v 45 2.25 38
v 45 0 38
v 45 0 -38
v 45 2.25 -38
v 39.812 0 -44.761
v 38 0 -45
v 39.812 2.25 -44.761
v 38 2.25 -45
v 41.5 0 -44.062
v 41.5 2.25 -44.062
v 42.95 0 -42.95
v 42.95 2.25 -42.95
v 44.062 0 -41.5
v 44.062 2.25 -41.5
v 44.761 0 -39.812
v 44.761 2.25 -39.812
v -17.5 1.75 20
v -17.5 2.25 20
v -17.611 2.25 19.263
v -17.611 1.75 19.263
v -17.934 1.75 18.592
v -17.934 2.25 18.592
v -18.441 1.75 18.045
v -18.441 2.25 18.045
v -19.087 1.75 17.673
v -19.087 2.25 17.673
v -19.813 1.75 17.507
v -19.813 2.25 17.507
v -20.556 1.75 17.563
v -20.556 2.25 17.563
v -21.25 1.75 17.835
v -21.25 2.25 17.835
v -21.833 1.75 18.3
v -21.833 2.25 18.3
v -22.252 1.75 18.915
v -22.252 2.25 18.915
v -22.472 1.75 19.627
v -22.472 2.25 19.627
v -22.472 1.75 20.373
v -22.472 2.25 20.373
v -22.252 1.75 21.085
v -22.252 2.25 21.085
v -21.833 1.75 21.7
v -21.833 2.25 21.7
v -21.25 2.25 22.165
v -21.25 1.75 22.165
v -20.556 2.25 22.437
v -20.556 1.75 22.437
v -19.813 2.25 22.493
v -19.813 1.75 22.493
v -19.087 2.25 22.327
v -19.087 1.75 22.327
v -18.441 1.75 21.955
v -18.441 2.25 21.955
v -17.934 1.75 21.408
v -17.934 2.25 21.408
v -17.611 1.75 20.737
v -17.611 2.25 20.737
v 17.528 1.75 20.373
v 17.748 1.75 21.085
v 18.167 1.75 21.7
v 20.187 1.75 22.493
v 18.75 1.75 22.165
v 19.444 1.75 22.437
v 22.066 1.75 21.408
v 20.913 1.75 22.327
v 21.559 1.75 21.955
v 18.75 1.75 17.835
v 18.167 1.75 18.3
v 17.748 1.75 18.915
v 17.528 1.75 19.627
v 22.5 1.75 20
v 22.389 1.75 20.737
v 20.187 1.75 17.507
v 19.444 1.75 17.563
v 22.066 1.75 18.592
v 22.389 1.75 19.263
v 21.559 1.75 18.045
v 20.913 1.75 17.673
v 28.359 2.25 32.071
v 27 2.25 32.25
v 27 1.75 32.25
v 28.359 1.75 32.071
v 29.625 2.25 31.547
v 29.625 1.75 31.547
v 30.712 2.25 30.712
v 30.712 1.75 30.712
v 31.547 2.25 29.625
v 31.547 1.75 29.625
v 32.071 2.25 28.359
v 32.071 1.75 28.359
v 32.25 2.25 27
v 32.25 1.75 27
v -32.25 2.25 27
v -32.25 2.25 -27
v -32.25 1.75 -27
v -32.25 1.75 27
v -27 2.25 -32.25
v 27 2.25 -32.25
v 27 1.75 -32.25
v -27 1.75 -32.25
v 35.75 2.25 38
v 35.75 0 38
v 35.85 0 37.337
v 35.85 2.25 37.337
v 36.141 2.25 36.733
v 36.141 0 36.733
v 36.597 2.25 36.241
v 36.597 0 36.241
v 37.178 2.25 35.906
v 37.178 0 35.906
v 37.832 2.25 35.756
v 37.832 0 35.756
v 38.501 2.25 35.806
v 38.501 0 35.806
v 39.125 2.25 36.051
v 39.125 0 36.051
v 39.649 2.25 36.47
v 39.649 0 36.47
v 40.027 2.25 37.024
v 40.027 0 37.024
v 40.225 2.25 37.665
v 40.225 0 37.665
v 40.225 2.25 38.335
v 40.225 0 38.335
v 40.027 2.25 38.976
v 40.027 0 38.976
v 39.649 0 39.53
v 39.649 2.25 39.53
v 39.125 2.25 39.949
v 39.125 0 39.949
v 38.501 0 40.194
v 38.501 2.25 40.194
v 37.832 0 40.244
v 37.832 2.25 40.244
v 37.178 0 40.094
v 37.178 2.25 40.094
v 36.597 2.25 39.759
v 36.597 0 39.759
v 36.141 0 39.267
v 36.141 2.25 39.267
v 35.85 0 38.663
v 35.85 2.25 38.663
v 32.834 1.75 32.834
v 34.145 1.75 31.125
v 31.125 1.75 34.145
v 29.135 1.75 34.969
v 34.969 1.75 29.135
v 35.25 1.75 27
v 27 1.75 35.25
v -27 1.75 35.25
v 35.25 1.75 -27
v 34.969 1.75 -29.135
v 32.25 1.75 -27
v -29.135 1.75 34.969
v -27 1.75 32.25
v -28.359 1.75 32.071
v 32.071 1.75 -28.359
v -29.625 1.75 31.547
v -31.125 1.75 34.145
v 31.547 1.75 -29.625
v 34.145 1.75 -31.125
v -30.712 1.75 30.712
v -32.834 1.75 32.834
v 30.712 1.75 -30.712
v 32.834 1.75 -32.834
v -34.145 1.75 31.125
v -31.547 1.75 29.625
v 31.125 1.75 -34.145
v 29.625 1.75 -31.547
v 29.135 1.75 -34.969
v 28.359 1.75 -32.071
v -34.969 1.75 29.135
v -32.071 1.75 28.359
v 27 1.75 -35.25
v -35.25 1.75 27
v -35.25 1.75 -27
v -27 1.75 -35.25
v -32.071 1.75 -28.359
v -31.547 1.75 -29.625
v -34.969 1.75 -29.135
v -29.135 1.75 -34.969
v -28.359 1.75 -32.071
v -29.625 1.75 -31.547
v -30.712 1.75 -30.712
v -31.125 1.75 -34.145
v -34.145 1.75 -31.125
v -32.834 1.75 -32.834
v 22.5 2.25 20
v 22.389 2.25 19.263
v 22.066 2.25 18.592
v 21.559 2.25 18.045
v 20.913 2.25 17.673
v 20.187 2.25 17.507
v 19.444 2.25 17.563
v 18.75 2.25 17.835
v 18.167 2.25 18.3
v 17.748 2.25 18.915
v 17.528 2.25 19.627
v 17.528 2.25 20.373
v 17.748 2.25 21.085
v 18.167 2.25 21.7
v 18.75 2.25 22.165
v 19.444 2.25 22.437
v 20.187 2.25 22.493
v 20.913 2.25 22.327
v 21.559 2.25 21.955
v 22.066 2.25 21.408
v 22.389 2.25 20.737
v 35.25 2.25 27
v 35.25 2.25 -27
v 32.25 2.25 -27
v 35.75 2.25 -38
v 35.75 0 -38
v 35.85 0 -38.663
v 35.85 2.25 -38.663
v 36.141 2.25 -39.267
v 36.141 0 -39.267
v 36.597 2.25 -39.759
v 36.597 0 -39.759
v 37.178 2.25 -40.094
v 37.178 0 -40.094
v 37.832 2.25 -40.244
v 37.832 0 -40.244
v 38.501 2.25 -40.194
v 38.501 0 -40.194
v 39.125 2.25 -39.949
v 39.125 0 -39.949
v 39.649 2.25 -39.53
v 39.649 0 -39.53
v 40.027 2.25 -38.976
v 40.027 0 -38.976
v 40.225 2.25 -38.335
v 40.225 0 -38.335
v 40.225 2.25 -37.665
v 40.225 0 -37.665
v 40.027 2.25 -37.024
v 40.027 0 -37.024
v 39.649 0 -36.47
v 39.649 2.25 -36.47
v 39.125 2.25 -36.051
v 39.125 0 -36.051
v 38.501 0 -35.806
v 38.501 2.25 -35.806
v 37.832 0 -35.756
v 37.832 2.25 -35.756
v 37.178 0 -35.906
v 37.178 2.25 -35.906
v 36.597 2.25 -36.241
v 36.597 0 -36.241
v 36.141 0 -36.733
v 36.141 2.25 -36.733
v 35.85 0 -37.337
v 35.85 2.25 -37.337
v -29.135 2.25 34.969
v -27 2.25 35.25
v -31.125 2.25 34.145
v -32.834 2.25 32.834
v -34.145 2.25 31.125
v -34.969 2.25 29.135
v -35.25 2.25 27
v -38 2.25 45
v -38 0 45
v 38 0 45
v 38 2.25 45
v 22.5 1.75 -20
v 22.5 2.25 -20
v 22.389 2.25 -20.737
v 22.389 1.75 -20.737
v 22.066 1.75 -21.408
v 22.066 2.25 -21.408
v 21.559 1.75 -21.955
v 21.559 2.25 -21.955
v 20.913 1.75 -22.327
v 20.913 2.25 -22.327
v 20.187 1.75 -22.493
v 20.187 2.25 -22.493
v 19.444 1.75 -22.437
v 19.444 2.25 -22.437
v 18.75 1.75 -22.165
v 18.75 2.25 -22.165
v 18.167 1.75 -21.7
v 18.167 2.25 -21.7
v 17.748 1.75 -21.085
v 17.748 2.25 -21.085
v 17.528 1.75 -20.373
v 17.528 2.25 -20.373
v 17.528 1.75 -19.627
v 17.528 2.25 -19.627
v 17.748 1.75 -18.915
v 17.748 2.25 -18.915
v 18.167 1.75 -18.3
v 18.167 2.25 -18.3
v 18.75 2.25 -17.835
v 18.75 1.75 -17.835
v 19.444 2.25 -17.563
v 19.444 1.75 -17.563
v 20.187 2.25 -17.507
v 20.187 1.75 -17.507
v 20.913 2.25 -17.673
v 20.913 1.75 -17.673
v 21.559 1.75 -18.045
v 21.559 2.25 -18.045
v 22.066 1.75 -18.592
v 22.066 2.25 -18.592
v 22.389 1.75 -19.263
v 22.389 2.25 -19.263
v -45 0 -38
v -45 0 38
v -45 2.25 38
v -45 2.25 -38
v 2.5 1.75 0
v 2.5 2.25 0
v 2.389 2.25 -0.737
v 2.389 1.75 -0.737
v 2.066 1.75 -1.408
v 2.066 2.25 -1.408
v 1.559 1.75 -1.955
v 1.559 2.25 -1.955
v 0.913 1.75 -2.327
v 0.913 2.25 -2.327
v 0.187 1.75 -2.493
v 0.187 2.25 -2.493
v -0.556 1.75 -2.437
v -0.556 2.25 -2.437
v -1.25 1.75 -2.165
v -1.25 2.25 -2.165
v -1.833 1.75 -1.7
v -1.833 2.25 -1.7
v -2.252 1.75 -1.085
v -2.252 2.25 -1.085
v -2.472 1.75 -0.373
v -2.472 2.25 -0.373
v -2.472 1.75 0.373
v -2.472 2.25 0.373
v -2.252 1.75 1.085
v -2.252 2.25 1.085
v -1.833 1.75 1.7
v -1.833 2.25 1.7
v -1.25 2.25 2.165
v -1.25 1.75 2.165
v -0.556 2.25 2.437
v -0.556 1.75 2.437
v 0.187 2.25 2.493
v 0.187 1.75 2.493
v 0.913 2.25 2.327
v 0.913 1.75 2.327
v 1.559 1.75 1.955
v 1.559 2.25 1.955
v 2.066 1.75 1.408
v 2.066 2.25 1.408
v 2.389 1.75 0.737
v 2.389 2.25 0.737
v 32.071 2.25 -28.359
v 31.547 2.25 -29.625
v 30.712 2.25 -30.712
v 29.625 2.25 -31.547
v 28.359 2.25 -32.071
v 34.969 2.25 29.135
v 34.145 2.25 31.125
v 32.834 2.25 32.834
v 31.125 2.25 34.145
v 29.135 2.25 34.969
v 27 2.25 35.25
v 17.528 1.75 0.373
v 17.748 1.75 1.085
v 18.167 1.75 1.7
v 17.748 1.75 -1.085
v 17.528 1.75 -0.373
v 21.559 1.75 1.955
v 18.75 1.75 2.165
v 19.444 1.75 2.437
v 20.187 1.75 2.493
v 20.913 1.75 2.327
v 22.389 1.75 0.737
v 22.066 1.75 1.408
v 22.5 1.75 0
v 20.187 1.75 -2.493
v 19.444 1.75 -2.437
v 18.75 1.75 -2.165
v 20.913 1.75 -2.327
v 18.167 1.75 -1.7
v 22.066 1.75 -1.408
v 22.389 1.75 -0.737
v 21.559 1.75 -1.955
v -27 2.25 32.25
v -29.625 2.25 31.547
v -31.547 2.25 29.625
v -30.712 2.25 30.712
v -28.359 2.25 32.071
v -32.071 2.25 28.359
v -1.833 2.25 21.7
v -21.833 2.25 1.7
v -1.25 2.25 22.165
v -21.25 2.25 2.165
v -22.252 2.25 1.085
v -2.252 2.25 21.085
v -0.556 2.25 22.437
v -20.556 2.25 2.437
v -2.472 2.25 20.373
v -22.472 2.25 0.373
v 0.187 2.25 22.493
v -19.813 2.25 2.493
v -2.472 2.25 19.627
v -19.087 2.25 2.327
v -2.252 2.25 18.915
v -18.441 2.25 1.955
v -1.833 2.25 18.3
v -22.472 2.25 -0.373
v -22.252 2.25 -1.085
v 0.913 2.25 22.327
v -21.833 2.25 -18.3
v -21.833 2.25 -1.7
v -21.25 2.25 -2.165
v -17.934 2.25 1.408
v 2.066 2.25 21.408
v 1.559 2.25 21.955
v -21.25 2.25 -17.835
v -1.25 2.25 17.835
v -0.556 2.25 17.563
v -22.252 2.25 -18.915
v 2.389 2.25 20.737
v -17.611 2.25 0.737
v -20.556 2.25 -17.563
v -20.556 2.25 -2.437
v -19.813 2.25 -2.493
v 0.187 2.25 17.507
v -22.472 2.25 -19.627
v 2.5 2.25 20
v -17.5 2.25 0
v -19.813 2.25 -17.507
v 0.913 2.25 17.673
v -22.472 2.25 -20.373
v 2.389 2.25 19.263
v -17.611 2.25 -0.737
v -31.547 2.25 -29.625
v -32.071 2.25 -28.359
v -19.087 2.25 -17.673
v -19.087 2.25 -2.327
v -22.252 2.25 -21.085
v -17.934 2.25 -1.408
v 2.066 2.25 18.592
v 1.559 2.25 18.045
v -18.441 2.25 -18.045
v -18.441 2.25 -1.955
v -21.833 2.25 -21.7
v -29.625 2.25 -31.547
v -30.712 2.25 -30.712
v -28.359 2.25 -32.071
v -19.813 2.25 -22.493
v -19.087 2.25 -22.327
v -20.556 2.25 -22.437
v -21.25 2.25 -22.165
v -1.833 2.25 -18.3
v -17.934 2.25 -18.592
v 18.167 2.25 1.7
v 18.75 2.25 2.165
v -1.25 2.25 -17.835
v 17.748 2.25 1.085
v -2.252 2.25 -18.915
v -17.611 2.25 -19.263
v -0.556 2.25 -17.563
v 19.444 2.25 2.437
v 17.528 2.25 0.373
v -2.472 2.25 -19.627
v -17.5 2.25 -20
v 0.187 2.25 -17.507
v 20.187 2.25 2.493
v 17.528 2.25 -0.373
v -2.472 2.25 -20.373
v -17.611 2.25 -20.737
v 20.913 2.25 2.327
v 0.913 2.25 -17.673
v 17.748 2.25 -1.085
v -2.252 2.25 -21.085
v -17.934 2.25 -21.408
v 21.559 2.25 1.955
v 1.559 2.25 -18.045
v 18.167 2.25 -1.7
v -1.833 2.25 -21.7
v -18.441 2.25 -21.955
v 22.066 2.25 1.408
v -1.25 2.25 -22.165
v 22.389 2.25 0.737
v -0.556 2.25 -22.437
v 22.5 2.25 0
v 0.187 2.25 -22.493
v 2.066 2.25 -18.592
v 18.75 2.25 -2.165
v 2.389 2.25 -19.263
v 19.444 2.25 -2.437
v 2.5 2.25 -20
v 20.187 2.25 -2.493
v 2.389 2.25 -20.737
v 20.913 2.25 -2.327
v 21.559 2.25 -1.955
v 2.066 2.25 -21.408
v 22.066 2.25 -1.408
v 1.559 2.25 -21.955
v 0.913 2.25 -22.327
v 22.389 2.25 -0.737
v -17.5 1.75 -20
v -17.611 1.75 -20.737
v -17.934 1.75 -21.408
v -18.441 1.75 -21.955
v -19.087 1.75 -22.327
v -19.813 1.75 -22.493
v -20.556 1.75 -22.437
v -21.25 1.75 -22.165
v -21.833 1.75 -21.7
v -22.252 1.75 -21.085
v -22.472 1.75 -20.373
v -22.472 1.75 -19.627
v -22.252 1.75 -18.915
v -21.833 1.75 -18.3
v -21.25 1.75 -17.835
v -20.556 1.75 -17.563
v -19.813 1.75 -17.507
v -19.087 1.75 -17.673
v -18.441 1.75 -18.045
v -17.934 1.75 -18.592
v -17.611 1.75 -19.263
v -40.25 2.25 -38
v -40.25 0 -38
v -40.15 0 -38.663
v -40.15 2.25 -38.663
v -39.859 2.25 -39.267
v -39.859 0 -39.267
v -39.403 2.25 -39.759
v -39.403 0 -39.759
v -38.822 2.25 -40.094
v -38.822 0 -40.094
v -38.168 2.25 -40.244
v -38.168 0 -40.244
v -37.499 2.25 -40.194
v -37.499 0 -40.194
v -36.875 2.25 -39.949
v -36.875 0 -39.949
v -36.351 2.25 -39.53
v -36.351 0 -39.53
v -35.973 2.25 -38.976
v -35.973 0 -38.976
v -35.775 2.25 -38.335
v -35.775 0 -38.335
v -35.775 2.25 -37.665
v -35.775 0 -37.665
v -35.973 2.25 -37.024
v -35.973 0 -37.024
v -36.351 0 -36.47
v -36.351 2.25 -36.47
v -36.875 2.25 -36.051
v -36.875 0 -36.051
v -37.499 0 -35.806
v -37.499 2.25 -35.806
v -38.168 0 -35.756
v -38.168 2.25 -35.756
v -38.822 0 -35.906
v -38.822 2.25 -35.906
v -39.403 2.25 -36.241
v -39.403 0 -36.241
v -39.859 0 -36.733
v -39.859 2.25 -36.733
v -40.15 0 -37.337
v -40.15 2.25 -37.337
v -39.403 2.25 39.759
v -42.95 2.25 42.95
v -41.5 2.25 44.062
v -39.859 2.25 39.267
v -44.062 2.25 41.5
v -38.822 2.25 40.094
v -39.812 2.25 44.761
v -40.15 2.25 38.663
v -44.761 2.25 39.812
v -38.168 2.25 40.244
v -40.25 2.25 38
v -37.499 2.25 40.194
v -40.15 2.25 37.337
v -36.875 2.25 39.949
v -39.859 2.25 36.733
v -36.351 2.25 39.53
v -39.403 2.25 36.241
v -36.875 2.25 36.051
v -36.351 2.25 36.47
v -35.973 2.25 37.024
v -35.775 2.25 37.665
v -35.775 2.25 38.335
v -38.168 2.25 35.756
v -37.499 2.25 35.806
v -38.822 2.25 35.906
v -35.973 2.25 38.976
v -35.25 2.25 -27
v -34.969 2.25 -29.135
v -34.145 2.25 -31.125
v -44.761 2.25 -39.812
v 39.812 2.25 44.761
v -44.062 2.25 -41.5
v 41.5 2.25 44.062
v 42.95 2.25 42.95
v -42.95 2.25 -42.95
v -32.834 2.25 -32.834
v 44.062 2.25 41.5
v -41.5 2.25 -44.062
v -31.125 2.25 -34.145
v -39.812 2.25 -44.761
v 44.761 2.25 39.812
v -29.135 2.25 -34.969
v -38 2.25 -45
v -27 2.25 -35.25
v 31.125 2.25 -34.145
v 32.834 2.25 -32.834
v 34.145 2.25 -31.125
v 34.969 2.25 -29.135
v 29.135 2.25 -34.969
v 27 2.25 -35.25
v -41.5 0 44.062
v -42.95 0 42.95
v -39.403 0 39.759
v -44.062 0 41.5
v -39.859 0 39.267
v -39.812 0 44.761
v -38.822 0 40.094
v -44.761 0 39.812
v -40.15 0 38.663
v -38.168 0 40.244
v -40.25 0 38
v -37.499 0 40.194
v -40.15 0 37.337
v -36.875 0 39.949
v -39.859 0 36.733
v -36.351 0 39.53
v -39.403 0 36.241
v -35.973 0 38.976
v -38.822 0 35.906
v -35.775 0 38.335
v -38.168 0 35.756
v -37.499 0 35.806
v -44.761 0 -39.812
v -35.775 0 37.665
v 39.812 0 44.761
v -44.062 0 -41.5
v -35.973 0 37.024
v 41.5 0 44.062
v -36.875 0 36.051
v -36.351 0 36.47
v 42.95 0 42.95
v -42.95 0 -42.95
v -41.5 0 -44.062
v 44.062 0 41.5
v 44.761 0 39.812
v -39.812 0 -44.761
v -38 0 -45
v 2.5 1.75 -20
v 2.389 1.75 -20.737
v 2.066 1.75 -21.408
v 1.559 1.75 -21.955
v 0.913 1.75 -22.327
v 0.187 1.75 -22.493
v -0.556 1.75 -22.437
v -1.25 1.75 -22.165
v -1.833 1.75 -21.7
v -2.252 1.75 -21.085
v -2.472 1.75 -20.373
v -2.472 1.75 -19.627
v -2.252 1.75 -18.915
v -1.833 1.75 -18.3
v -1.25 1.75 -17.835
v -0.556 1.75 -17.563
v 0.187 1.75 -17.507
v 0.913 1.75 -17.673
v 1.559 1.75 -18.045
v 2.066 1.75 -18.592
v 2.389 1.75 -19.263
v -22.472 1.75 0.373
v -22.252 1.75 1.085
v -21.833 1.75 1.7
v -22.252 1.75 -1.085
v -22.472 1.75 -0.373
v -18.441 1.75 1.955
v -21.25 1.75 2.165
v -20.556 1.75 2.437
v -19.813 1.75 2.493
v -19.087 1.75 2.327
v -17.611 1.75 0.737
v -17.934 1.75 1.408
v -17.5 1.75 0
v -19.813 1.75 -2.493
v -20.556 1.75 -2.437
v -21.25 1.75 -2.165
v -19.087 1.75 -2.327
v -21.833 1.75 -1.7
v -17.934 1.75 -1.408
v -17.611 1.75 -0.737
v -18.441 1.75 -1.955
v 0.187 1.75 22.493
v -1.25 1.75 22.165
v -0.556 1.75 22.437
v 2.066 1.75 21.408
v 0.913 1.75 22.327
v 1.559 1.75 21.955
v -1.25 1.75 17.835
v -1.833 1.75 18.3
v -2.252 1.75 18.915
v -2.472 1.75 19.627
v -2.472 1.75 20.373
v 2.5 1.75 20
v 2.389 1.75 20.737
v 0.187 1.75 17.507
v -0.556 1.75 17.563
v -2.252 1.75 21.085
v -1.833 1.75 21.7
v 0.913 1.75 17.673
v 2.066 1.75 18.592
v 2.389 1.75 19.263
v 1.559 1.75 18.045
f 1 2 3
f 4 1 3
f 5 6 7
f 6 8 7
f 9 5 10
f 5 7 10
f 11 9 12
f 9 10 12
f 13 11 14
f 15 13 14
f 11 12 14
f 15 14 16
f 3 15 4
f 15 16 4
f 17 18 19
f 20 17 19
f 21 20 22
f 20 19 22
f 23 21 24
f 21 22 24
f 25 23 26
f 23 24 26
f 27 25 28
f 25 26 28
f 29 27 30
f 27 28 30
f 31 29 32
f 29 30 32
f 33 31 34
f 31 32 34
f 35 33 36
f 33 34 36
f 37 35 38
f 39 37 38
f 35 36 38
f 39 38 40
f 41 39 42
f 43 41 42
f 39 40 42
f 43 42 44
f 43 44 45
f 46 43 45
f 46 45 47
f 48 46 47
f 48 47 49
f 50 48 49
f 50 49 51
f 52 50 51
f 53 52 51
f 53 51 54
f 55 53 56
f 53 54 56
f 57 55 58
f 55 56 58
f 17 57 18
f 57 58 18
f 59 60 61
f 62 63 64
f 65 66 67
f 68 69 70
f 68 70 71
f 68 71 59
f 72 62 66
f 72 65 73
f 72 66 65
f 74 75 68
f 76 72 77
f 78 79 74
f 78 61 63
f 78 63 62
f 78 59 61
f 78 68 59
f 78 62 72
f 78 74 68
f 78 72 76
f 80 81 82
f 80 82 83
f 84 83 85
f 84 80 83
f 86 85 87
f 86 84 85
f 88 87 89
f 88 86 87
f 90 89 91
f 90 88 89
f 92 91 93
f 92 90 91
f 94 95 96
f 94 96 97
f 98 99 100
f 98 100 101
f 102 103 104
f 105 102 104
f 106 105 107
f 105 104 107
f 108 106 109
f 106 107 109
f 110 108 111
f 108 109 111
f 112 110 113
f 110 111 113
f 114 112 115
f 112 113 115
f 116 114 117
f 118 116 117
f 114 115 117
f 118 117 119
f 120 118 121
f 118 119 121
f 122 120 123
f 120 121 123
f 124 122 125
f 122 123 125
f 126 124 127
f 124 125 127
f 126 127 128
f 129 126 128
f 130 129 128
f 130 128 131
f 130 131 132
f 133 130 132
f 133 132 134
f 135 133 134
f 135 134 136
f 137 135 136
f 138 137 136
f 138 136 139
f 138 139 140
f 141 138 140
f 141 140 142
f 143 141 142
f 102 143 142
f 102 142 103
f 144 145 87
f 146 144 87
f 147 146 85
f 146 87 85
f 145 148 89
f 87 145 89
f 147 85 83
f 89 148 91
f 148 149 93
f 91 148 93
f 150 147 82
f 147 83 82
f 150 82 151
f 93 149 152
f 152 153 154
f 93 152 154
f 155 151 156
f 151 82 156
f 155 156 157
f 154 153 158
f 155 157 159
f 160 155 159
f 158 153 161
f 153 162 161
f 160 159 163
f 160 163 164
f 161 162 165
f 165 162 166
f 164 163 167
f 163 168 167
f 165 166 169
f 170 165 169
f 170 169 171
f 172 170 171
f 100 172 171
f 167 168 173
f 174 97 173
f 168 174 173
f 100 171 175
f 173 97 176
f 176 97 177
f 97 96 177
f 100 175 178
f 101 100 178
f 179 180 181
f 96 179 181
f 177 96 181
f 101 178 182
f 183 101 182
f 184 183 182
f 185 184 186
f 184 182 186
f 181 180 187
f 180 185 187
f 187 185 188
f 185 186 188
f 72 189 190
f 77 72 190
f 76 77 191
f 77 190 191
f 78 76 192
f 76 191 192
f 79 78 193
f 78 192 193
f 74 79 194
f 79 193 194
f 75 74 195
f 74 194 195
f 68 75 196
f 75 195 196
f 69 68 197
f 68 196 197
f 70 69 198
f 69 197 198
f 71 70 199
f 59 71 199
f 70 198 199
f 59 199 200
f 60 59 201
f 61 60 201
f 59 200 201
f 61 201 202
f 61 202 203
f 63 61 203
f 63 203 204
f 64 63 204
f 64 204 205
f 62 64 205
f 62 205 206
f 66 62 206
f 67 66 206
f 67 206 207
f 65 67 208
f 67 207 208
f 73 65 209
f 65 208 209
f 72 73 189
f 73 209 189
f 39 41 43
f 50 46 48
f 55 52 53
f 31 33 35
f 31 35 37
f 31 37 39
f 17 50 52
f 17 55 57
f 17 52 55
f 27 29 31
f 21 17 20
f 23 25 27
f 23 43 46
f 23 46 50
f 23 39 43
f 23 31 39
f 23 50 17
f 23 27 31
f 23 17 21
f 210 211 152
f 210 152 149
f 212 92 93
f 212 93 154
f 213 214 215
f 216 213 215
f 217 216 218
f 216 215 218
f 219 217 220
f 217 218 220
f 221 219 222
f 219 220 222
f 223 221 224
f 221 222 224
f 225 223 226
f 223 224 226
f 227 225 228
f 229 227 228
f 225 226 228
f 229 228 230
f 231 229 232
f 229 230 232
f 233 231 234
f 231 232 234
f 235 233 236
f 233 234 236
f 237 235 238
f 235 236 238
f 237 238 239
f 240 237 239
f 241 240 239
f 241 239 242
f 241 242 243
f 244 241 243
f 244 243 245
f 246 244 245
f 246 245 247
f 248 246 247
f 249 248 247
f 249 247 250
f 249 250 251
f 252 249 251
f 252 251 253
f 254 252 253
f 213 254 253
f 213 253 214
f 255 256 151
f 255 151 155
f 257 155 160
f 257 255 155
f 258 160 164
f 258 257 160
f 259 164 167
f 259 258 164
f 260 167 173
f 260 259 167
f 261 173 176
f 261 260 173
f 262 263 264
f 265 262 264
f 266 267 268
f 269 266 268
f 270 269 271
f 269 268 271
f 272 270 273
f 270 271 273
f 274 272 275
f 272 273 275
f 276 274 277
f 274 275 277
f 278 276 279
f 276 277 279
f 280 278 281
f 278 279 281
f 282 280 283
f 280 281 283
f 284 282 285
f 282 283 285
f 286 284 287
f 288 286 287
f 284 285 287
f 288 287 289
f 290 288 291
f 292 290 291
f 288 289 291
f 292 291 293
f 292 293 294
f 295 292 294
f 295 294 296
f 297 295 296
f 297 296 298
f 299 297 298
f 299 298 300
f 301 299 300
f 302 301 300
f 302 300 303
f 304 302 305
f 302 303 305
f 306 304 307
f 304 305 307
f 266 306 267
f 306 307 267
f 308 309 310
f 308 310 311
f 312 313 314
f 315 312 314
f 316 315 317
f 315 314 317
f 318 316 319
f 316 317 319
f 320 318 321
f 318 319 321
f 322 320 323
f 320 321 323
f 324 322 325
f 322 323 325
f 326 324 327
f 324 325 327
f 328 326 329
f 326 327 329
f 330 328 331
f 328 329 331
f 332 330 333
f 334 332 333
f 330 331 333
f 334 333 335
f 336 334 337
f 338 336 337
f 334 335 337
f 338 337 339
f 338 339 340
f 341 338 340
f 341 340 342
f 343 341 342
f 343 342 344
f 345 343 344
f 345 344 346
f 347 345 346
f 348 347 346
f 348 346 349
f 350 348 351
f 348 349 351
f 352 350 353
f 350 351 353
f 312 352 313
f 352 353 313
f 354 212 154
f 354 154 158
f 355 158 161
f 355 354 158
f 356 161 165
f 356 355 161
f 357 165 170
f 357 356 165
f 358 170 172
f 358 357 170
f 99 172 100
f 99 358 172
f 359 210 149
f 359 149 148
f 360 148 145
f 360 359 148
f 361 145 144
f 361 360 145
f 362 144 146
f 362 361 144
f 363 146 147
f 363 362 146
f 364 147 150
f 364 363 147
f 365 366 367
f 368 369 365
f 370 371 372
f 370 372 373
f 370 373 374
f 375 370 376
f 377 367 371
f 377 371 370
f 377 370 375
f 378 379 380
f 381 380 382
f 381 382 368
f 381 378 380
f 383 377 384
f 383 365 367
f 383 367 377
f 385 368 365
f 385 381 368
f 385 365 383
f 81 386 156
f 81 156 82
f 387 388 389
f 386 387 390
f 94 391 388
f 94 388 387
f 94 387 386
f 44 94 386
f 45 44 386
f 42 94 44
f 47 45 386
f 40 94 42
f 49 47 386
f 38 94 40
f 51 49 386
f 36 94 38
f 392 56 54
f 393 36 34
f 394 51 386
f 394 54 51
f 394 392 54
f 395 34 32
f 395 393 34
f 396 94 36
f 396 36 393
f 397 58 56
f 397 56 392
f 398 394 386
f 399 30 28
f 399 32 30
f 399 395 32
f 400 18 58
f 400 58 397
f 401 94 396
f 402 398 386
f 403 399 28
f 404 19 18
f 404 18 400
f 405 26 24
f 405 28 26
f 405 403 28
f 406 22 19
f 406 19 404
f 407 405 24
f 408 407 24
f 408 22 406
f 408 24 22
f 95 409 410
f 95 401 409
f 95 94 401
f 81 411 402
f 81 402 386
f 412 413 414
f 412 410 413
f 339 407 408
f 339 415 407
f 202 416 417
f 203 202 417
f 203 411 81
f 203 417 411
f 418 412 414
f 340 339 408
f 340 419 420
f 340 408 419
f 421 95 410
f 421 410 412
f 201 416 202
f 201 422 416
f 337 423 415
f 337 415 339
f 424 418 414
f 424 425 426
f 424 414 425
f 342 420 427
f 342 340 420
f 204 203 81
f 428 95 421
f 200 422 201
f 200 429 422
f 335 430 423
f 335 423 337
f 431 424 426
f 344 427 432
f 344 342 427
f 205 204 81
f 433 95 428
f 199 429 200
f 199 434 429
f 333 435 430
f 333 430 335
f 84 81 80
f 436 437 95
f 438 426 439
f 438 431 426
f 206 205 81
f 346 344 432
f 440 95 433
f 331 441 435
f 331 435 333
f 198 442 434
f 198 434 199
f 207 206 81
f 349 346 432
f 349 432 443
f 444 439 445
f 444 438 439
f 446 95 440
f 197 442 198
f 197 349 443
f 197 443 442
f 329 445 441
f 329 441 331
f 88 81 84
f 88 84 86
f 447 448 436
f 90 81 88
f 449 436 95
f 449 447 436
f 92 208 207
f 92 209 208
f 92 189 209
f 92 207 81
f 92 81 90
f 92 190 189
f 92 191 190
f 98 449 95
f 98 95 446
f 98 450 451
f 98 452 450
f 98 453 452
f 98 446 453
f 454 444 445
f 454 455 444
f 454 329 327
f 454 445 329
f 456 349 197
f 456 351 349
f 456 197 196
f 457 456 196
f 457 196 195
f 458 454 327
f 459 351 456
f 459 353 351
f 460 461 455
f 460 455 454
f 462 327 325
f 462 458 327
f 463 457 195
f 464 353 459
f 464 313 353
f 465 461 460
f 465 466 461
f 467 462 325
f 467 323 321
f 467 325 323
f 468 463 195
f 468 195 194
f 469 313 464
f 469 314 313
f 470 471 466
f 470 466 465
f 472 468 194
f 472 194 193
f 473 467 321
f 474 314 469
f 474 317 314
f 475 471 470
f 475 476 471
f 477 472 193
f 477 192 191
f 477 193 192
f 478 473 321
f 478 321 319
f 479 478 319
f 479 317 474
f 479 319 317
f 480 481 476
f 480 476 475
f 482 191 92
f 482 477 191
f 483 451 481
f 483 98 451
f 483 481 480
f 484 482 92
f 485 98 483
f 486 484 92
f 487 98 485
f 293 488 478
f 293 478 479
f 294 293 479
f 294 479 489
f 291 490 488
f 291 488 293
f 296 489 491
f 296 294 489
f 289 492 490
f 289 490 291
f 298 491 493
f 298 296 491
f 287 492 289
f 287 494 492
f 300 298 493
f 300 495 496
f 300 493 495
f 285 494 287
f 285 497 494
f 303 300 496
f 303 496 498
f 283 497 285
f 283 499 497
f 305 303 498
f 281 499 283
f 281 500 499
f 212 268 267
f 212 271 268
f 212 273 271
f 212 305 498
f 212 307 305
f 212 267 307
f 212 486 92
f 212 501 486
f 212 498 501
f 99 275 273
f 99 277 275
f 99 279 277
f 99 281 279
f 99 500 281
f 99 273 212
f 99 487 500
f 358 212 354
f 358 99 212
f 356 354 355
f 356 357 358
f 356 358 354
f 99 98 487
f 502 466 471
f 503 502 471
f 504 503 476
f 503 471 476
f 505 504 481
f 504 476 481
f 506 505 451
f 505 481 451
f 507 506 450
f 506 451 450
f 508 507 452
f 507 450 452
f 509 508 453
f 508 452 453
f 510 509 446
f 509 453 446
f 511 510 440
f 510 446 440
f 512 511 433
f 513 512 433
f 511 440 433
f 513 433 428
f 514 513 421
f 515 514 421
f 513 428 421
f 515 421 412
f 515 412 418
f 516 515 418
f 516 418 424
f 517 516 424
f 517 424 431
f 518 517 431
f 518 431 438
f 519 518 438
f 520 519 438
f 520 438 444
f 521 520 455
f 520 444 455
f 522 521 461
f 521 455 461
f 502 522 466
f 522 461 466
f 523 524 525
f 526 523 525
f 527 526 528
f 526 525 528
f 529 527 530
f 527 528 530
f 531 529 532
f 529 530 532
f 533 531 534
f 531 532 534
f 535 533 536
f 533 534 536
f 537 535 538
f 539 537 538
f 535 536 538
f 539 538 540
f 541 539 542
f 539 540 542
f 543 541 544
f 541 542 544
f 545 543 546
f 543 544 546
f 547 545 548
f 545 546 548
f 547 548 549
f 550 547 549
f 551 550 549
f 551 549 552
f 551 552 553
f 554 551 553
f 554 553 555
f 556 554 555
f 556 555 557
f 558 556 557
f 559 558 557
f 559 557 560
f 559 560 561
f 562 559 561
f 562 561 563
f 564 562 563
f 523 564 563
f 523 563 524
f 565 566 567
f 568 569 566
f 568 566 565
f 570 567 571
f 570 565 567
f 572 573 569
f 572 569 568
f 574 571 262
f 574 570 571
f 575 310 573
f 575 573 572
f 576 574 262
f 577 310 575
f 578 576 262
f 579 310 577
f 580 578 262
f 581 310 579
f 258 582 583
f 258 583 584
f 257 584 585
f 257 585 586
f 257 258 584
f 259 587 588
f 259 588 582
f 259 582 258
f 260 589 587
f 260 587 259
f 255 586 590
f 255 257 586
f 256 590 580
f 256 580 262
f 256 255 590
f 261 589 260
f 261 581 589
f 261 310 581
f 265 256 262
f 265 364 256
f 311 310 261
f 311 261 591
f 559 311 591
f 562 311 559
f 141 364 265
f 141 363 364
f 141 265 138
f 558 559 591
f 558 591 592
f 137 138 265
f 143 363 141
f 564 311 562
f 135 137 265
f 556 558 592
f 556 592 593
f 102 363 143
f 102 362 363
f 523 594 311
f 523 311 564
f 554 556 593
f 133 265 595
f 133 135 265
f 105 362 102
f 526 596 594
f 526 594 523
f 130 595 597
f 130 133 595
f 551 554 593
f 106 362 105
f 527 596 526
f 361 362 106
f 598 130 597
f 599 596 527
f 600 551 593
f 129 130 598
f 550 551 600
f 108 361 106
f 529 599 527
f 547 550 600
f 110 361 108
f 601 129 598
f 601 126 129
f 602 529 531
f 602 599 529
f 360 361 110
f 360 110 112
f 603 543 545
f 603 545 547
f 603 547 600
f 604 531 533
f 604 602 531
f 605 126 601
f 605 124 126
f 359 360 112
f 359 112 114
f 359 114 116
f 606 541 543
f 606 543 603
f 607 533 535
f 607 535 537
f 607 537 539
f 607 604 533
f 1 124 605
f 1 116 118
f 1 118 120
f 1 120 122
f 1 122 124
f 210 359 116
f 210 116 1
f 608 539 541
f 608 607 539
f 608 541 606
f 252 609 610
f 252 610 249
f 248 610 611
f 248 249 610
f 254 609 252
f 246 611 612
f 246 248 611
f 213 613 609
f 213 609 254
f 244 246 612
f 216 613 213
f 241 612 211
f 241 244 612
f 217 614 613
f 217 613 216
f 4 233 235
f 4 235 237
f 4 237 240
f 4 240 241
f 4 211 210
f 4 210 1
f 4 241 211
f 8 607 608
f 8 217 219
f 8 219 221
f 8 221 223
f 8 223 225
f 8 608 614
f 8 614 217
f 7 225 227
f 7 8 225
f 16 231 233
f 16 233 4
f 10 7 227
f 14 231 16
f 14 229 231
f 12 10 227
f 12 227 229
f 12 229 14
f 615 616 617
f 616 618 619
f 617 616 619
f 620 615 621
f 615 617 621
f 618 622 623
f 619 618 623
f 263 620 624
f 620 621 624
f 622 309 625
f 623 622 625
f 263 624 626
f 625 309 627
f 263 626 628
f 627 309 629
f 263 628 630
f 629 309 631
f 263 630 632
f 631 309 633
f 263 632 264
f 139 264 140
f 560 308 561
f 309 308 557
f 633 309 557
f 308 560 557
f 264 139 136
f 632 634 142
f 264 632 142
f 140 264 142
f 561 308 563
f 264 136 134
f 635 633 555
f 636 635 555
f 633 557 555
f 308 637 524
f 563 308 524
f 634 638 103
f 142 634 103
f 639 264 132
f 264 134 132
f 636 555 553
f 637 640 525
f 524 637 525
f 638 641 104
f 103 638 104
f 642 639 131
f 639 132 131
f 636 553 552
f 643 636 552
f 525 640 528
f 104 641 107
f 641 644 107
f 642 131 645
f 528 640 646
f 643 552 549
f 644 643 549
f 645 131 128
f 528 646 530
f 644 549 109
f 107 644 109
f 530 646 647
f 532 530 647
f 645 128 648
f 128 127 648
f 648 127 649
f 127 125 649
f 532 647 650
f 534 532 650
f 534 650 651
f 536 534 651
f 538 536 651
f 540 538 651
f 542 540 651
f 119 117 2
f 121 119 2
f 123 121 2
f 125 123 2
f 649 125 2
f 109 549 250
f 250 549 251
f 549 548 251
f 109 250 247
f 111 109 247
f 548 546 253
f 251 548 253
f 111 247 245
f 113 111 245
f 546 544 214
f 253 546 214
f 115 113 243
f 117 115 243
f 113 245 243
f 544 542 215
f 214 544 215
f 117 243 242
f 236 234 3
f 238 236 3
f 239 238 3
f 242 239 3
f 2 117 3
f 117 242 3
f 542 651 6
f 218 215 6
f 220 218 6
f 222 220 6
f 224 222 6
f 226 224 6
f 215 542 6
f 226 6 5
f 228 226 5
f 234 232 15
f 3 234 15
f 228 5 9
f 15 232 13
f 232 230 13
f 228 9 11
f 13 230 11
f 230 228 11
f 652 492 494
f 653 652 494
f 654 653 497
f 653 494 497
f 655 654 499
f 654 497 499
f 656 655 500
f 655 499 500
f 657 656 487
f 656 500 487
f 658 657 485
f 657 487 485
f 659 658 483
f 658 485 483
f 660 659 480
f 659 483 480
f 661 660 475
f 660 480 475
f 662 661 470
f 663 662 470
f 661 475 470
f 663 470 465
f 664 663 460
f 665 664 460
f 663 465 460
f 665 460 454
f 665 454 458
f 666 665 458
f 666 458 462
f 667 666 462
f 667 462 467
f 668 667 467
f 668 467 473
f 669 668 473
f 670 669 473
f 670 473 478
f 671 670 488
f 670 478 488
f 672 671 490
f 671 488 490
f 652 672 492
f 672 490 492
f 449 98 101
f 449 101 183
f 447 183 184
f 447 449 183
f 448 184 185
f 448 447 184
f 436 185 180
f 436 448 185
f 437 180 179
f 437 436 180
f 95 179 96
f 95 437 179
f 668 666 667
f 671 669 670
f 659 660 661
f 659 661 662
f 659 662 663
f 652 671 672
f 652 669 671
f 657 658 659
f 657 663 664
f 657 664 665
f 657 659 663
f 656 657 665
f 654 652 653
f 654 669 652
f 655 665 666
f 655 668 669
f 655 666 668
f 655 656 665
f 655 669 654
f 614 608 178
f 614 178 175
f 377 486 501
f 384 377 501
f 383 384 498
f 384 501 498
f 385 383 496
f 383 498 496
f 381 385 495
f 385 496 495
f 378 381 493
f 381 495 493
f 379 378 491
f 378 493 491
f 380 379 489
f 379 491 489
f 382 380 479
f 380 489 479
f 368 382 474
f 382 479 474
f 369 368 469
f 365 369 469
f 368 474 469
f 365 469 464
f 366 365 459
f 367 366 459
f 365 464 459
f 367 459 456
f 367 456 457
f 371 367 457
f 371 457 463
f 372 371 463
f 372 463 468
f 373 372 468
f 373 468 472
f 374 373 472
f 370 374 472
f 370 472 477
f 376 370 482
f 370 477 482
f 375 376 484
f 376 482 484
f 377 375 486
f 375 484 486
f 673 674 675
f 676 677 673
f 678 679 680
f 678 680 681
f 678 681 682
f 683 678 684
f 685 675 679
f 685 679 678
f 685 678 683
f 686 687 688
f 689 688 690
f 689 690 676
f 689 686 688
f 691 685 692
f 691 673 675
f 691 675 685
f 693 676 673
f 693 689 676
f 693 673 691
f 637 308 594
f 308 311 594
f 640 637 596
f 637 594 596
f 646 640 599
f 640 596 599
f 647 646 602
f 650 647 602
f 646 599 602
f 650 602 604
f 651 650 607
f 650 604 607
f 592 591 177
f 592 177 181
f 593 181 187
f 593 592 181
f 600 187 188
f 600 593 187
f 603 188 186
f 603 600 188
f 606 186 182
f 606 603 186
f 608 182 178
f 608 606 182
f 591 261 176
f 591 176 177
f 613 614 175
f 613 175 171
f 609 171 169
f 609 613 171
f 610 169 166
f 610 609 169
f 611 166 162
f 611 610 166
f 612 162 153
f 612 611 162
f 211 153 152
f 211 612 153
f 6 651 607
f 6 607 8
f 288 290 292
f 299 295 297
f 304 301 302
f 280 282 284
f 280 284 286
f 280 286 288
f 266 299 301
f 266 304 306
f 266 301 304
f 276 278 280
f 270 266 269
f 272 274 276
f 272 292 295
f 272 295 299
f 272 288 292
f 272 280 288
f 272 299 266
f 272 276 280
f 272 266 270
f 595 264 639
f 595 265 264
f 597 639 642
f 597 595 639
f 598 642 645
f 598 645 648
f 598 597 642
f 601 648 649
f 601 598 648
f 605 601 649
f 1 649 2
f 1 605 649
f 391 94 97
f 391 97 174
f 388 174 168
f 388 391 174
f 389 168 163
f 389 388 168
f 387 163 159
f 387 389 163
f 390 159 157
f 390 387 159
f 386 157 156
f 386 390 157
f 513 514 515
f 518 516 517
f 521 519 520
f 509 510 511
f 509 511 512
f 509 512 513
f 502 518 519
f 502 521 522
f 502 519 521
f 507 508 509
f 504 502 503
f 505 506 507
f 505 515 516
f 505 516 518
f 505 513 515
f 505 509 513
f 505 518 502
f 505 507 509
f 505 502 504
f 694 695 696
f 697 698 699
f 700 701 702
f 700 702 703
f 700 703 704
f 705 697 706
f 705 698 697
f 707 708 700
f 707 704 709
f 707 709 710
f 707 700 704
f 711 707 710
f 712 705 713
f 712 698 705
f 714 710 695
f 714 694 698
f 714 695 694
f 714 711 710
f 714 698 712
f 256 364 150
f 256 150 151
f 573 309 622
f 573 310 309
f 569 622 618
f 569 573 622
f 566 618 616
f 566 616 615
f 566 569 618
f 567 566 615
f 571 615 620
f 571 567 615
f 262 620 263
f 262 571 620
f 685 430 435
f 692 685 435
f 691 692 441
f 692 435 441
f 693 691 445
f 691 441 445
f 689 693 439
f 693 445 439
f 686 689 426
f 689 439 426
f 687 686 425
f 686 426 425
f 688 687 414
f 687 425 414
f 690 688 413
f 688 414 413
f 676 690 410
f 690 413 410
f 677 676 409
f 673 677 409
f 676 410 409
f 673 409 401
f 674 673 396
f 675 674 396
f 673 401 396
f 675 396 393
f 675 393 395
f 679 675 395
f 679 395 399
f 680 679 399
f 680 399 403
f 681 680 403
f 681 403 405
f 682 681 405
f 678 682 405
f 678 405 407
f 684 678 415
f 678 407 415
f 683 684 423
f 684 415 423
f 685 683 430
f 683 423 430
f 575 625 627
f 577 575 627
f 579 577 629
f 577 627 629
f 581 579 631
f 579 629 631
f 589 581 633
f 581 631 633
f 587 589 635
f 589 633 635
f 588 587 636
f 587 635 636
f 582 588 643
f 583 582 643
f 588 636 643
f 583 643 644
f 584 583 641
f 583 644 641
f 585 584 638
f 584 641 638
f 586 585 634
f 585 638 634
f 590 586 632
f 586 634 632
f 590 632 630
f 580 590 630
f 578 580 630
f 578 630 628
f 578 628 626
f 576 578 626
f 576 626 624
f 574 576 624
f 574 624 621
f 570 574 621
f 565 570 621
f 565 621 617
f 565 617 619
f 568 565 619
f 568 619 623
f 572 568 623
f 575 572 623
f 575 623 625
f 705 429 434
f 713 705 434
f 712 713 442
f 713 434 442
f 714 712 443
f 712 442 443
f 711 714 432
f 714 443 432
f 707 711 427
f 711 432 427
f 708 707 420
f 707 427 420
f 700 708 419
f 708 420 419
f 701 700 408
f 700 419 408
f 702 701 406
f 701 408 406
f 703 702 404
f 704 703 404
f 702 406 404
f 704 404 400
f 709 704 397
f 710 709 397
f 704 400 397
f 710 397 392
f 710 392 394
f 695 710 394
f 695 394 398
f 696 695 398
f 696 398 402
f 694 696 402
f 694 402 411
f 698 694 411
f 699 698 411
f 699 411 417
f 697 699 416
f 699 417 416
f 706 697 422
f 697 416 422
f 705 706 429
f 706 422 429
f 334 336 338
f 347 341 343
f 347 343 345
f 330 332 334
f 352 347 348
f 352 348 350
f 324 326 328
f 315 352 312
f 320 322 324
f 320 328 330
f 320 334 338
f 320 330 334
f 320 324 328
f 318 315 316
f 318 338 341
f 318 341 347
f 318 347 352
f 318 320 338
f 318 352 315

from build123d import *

# Parameters (mm, degrees)
SKETCH1_W            = 90
SKETCH1_H            = 90
BOSS_EXTRUDE1_DEPTH  = 2.25
SKETCH2_R            = 2.5
CUT_EXTRUDE1_DEPTH   = 0.5
FILLET1_R            = 7
M4_CLEARANCE_HOLE1_D = 4.5


with BuildPart() as part:
    # Sketch1 → Boss-Extrude1 (new body)
    with BuildSketch(Plane(origin=(0, 0, 0), x_dir=(1, 0, 0), z_dir=(0, 1, 0))):
        Rectangle(SKETCH1_W, SKETCH1_H)
    extrude(amount=BOSS_EXTRUDE1_DEPTH)

    # Sketch2 → Cut-Extrude1 (cut)
    with BuildSketch(Plane(origin=(0, 2.25, 0), x_dir=(1, 0, 0), z_dir=(0, 1, 0))):
        with BuildLine():
            ThreePointArc((-35.25, 27), (-32.833630945, 32.833630945), (-27, 35.25))
            Line((-27, 35.25), (27, 35.25))
            ThreePointArc((27, 35.25), (32.833630945, 32.833630945), (35.25, 27))
            Line((35.25, 27), (35.25, -27))
            ThreePointArc((35.25, -27), (32.833630945, -32.833630945), (27, -35.25))
            Line((27, -35.25), (-27, -35.25))
            ThreePointArc((-27, -35.25), (-32.833630945, -32.833630945), (-35.25, -27))
            Line((-35.25, -27), (-35.25, 27))
        make_face()
        with BuildLine():
            Line((-27, -32.25), (27, -32.25))
            ThreePointArc((27, -32.25), (30.712310601, -30.712310601), (32.25, -27))
            Line((32.25, -27), (32.25, 27))
            ThreePointArc((32.25, 27), (30.712310601, 30.712310601), (27, 32.25))
            Line((27, 32.25), (-27, 32.25))
            ThreePointArc((-27, 32.25), (-30.712310601, 30.712310601), (-32.25, 27))
            Line((-32.25, 27), (-32.25, -27))
            ThreePointArc((-32.25, -27), (-30.712310601, -30.712310601), (-27, -32.25))
        make_face(mode=Mode.SUBTRACT)
        with Locations((-20, 20)):
            Circle(SKETCH2_R)
        with Locations((0, 20)):
            Circle(SKETCH2_R)
        with Locations((20, 20)):
            Circle(SKETCH2_R)
        with Locations((20, 0)):
            Circle(SKETCH2_R)
        with Locations((20, -20)):
            Circle(SKETCH2_R)
        with Locations((0, -20)):
            Circle(SKETCH2_R)
        Circle(SKETCH2_R)
        with Locations((-20, 0)):
            Circle(SKETCH2_R)
        with Locations((-20, -20)):
            Circle(SKETCH2_R)
    extrude(amount=-CUT_EXTRUDE1_DEPTH, mode=Mode.SUBTRACT)

    # Fillet1
    fillet1_edges = [part.edges().sort_by_distance(p)[0] for p in [
        (45, 1.125, 45),
        (-45, 1.125, 45),
        (-45, 1.125, -45),
        (45, 1.125, -45),
    ]]
    fillet(fillet1_edges, radius=FILLET1_R)

    # M4 Clearance Hole1 (through all)
    with Locations(Plane(origin=(0, 2.25, 0), x_dir=(1, 0, 0), z_dir=(0, 1, 0))):
        with Locations((-38, 38), (38, 38), (38, -38), (-38, -38)):
            Hole(M4_CLEARANCE_HOLE1_D / 2)


solid = part.part
